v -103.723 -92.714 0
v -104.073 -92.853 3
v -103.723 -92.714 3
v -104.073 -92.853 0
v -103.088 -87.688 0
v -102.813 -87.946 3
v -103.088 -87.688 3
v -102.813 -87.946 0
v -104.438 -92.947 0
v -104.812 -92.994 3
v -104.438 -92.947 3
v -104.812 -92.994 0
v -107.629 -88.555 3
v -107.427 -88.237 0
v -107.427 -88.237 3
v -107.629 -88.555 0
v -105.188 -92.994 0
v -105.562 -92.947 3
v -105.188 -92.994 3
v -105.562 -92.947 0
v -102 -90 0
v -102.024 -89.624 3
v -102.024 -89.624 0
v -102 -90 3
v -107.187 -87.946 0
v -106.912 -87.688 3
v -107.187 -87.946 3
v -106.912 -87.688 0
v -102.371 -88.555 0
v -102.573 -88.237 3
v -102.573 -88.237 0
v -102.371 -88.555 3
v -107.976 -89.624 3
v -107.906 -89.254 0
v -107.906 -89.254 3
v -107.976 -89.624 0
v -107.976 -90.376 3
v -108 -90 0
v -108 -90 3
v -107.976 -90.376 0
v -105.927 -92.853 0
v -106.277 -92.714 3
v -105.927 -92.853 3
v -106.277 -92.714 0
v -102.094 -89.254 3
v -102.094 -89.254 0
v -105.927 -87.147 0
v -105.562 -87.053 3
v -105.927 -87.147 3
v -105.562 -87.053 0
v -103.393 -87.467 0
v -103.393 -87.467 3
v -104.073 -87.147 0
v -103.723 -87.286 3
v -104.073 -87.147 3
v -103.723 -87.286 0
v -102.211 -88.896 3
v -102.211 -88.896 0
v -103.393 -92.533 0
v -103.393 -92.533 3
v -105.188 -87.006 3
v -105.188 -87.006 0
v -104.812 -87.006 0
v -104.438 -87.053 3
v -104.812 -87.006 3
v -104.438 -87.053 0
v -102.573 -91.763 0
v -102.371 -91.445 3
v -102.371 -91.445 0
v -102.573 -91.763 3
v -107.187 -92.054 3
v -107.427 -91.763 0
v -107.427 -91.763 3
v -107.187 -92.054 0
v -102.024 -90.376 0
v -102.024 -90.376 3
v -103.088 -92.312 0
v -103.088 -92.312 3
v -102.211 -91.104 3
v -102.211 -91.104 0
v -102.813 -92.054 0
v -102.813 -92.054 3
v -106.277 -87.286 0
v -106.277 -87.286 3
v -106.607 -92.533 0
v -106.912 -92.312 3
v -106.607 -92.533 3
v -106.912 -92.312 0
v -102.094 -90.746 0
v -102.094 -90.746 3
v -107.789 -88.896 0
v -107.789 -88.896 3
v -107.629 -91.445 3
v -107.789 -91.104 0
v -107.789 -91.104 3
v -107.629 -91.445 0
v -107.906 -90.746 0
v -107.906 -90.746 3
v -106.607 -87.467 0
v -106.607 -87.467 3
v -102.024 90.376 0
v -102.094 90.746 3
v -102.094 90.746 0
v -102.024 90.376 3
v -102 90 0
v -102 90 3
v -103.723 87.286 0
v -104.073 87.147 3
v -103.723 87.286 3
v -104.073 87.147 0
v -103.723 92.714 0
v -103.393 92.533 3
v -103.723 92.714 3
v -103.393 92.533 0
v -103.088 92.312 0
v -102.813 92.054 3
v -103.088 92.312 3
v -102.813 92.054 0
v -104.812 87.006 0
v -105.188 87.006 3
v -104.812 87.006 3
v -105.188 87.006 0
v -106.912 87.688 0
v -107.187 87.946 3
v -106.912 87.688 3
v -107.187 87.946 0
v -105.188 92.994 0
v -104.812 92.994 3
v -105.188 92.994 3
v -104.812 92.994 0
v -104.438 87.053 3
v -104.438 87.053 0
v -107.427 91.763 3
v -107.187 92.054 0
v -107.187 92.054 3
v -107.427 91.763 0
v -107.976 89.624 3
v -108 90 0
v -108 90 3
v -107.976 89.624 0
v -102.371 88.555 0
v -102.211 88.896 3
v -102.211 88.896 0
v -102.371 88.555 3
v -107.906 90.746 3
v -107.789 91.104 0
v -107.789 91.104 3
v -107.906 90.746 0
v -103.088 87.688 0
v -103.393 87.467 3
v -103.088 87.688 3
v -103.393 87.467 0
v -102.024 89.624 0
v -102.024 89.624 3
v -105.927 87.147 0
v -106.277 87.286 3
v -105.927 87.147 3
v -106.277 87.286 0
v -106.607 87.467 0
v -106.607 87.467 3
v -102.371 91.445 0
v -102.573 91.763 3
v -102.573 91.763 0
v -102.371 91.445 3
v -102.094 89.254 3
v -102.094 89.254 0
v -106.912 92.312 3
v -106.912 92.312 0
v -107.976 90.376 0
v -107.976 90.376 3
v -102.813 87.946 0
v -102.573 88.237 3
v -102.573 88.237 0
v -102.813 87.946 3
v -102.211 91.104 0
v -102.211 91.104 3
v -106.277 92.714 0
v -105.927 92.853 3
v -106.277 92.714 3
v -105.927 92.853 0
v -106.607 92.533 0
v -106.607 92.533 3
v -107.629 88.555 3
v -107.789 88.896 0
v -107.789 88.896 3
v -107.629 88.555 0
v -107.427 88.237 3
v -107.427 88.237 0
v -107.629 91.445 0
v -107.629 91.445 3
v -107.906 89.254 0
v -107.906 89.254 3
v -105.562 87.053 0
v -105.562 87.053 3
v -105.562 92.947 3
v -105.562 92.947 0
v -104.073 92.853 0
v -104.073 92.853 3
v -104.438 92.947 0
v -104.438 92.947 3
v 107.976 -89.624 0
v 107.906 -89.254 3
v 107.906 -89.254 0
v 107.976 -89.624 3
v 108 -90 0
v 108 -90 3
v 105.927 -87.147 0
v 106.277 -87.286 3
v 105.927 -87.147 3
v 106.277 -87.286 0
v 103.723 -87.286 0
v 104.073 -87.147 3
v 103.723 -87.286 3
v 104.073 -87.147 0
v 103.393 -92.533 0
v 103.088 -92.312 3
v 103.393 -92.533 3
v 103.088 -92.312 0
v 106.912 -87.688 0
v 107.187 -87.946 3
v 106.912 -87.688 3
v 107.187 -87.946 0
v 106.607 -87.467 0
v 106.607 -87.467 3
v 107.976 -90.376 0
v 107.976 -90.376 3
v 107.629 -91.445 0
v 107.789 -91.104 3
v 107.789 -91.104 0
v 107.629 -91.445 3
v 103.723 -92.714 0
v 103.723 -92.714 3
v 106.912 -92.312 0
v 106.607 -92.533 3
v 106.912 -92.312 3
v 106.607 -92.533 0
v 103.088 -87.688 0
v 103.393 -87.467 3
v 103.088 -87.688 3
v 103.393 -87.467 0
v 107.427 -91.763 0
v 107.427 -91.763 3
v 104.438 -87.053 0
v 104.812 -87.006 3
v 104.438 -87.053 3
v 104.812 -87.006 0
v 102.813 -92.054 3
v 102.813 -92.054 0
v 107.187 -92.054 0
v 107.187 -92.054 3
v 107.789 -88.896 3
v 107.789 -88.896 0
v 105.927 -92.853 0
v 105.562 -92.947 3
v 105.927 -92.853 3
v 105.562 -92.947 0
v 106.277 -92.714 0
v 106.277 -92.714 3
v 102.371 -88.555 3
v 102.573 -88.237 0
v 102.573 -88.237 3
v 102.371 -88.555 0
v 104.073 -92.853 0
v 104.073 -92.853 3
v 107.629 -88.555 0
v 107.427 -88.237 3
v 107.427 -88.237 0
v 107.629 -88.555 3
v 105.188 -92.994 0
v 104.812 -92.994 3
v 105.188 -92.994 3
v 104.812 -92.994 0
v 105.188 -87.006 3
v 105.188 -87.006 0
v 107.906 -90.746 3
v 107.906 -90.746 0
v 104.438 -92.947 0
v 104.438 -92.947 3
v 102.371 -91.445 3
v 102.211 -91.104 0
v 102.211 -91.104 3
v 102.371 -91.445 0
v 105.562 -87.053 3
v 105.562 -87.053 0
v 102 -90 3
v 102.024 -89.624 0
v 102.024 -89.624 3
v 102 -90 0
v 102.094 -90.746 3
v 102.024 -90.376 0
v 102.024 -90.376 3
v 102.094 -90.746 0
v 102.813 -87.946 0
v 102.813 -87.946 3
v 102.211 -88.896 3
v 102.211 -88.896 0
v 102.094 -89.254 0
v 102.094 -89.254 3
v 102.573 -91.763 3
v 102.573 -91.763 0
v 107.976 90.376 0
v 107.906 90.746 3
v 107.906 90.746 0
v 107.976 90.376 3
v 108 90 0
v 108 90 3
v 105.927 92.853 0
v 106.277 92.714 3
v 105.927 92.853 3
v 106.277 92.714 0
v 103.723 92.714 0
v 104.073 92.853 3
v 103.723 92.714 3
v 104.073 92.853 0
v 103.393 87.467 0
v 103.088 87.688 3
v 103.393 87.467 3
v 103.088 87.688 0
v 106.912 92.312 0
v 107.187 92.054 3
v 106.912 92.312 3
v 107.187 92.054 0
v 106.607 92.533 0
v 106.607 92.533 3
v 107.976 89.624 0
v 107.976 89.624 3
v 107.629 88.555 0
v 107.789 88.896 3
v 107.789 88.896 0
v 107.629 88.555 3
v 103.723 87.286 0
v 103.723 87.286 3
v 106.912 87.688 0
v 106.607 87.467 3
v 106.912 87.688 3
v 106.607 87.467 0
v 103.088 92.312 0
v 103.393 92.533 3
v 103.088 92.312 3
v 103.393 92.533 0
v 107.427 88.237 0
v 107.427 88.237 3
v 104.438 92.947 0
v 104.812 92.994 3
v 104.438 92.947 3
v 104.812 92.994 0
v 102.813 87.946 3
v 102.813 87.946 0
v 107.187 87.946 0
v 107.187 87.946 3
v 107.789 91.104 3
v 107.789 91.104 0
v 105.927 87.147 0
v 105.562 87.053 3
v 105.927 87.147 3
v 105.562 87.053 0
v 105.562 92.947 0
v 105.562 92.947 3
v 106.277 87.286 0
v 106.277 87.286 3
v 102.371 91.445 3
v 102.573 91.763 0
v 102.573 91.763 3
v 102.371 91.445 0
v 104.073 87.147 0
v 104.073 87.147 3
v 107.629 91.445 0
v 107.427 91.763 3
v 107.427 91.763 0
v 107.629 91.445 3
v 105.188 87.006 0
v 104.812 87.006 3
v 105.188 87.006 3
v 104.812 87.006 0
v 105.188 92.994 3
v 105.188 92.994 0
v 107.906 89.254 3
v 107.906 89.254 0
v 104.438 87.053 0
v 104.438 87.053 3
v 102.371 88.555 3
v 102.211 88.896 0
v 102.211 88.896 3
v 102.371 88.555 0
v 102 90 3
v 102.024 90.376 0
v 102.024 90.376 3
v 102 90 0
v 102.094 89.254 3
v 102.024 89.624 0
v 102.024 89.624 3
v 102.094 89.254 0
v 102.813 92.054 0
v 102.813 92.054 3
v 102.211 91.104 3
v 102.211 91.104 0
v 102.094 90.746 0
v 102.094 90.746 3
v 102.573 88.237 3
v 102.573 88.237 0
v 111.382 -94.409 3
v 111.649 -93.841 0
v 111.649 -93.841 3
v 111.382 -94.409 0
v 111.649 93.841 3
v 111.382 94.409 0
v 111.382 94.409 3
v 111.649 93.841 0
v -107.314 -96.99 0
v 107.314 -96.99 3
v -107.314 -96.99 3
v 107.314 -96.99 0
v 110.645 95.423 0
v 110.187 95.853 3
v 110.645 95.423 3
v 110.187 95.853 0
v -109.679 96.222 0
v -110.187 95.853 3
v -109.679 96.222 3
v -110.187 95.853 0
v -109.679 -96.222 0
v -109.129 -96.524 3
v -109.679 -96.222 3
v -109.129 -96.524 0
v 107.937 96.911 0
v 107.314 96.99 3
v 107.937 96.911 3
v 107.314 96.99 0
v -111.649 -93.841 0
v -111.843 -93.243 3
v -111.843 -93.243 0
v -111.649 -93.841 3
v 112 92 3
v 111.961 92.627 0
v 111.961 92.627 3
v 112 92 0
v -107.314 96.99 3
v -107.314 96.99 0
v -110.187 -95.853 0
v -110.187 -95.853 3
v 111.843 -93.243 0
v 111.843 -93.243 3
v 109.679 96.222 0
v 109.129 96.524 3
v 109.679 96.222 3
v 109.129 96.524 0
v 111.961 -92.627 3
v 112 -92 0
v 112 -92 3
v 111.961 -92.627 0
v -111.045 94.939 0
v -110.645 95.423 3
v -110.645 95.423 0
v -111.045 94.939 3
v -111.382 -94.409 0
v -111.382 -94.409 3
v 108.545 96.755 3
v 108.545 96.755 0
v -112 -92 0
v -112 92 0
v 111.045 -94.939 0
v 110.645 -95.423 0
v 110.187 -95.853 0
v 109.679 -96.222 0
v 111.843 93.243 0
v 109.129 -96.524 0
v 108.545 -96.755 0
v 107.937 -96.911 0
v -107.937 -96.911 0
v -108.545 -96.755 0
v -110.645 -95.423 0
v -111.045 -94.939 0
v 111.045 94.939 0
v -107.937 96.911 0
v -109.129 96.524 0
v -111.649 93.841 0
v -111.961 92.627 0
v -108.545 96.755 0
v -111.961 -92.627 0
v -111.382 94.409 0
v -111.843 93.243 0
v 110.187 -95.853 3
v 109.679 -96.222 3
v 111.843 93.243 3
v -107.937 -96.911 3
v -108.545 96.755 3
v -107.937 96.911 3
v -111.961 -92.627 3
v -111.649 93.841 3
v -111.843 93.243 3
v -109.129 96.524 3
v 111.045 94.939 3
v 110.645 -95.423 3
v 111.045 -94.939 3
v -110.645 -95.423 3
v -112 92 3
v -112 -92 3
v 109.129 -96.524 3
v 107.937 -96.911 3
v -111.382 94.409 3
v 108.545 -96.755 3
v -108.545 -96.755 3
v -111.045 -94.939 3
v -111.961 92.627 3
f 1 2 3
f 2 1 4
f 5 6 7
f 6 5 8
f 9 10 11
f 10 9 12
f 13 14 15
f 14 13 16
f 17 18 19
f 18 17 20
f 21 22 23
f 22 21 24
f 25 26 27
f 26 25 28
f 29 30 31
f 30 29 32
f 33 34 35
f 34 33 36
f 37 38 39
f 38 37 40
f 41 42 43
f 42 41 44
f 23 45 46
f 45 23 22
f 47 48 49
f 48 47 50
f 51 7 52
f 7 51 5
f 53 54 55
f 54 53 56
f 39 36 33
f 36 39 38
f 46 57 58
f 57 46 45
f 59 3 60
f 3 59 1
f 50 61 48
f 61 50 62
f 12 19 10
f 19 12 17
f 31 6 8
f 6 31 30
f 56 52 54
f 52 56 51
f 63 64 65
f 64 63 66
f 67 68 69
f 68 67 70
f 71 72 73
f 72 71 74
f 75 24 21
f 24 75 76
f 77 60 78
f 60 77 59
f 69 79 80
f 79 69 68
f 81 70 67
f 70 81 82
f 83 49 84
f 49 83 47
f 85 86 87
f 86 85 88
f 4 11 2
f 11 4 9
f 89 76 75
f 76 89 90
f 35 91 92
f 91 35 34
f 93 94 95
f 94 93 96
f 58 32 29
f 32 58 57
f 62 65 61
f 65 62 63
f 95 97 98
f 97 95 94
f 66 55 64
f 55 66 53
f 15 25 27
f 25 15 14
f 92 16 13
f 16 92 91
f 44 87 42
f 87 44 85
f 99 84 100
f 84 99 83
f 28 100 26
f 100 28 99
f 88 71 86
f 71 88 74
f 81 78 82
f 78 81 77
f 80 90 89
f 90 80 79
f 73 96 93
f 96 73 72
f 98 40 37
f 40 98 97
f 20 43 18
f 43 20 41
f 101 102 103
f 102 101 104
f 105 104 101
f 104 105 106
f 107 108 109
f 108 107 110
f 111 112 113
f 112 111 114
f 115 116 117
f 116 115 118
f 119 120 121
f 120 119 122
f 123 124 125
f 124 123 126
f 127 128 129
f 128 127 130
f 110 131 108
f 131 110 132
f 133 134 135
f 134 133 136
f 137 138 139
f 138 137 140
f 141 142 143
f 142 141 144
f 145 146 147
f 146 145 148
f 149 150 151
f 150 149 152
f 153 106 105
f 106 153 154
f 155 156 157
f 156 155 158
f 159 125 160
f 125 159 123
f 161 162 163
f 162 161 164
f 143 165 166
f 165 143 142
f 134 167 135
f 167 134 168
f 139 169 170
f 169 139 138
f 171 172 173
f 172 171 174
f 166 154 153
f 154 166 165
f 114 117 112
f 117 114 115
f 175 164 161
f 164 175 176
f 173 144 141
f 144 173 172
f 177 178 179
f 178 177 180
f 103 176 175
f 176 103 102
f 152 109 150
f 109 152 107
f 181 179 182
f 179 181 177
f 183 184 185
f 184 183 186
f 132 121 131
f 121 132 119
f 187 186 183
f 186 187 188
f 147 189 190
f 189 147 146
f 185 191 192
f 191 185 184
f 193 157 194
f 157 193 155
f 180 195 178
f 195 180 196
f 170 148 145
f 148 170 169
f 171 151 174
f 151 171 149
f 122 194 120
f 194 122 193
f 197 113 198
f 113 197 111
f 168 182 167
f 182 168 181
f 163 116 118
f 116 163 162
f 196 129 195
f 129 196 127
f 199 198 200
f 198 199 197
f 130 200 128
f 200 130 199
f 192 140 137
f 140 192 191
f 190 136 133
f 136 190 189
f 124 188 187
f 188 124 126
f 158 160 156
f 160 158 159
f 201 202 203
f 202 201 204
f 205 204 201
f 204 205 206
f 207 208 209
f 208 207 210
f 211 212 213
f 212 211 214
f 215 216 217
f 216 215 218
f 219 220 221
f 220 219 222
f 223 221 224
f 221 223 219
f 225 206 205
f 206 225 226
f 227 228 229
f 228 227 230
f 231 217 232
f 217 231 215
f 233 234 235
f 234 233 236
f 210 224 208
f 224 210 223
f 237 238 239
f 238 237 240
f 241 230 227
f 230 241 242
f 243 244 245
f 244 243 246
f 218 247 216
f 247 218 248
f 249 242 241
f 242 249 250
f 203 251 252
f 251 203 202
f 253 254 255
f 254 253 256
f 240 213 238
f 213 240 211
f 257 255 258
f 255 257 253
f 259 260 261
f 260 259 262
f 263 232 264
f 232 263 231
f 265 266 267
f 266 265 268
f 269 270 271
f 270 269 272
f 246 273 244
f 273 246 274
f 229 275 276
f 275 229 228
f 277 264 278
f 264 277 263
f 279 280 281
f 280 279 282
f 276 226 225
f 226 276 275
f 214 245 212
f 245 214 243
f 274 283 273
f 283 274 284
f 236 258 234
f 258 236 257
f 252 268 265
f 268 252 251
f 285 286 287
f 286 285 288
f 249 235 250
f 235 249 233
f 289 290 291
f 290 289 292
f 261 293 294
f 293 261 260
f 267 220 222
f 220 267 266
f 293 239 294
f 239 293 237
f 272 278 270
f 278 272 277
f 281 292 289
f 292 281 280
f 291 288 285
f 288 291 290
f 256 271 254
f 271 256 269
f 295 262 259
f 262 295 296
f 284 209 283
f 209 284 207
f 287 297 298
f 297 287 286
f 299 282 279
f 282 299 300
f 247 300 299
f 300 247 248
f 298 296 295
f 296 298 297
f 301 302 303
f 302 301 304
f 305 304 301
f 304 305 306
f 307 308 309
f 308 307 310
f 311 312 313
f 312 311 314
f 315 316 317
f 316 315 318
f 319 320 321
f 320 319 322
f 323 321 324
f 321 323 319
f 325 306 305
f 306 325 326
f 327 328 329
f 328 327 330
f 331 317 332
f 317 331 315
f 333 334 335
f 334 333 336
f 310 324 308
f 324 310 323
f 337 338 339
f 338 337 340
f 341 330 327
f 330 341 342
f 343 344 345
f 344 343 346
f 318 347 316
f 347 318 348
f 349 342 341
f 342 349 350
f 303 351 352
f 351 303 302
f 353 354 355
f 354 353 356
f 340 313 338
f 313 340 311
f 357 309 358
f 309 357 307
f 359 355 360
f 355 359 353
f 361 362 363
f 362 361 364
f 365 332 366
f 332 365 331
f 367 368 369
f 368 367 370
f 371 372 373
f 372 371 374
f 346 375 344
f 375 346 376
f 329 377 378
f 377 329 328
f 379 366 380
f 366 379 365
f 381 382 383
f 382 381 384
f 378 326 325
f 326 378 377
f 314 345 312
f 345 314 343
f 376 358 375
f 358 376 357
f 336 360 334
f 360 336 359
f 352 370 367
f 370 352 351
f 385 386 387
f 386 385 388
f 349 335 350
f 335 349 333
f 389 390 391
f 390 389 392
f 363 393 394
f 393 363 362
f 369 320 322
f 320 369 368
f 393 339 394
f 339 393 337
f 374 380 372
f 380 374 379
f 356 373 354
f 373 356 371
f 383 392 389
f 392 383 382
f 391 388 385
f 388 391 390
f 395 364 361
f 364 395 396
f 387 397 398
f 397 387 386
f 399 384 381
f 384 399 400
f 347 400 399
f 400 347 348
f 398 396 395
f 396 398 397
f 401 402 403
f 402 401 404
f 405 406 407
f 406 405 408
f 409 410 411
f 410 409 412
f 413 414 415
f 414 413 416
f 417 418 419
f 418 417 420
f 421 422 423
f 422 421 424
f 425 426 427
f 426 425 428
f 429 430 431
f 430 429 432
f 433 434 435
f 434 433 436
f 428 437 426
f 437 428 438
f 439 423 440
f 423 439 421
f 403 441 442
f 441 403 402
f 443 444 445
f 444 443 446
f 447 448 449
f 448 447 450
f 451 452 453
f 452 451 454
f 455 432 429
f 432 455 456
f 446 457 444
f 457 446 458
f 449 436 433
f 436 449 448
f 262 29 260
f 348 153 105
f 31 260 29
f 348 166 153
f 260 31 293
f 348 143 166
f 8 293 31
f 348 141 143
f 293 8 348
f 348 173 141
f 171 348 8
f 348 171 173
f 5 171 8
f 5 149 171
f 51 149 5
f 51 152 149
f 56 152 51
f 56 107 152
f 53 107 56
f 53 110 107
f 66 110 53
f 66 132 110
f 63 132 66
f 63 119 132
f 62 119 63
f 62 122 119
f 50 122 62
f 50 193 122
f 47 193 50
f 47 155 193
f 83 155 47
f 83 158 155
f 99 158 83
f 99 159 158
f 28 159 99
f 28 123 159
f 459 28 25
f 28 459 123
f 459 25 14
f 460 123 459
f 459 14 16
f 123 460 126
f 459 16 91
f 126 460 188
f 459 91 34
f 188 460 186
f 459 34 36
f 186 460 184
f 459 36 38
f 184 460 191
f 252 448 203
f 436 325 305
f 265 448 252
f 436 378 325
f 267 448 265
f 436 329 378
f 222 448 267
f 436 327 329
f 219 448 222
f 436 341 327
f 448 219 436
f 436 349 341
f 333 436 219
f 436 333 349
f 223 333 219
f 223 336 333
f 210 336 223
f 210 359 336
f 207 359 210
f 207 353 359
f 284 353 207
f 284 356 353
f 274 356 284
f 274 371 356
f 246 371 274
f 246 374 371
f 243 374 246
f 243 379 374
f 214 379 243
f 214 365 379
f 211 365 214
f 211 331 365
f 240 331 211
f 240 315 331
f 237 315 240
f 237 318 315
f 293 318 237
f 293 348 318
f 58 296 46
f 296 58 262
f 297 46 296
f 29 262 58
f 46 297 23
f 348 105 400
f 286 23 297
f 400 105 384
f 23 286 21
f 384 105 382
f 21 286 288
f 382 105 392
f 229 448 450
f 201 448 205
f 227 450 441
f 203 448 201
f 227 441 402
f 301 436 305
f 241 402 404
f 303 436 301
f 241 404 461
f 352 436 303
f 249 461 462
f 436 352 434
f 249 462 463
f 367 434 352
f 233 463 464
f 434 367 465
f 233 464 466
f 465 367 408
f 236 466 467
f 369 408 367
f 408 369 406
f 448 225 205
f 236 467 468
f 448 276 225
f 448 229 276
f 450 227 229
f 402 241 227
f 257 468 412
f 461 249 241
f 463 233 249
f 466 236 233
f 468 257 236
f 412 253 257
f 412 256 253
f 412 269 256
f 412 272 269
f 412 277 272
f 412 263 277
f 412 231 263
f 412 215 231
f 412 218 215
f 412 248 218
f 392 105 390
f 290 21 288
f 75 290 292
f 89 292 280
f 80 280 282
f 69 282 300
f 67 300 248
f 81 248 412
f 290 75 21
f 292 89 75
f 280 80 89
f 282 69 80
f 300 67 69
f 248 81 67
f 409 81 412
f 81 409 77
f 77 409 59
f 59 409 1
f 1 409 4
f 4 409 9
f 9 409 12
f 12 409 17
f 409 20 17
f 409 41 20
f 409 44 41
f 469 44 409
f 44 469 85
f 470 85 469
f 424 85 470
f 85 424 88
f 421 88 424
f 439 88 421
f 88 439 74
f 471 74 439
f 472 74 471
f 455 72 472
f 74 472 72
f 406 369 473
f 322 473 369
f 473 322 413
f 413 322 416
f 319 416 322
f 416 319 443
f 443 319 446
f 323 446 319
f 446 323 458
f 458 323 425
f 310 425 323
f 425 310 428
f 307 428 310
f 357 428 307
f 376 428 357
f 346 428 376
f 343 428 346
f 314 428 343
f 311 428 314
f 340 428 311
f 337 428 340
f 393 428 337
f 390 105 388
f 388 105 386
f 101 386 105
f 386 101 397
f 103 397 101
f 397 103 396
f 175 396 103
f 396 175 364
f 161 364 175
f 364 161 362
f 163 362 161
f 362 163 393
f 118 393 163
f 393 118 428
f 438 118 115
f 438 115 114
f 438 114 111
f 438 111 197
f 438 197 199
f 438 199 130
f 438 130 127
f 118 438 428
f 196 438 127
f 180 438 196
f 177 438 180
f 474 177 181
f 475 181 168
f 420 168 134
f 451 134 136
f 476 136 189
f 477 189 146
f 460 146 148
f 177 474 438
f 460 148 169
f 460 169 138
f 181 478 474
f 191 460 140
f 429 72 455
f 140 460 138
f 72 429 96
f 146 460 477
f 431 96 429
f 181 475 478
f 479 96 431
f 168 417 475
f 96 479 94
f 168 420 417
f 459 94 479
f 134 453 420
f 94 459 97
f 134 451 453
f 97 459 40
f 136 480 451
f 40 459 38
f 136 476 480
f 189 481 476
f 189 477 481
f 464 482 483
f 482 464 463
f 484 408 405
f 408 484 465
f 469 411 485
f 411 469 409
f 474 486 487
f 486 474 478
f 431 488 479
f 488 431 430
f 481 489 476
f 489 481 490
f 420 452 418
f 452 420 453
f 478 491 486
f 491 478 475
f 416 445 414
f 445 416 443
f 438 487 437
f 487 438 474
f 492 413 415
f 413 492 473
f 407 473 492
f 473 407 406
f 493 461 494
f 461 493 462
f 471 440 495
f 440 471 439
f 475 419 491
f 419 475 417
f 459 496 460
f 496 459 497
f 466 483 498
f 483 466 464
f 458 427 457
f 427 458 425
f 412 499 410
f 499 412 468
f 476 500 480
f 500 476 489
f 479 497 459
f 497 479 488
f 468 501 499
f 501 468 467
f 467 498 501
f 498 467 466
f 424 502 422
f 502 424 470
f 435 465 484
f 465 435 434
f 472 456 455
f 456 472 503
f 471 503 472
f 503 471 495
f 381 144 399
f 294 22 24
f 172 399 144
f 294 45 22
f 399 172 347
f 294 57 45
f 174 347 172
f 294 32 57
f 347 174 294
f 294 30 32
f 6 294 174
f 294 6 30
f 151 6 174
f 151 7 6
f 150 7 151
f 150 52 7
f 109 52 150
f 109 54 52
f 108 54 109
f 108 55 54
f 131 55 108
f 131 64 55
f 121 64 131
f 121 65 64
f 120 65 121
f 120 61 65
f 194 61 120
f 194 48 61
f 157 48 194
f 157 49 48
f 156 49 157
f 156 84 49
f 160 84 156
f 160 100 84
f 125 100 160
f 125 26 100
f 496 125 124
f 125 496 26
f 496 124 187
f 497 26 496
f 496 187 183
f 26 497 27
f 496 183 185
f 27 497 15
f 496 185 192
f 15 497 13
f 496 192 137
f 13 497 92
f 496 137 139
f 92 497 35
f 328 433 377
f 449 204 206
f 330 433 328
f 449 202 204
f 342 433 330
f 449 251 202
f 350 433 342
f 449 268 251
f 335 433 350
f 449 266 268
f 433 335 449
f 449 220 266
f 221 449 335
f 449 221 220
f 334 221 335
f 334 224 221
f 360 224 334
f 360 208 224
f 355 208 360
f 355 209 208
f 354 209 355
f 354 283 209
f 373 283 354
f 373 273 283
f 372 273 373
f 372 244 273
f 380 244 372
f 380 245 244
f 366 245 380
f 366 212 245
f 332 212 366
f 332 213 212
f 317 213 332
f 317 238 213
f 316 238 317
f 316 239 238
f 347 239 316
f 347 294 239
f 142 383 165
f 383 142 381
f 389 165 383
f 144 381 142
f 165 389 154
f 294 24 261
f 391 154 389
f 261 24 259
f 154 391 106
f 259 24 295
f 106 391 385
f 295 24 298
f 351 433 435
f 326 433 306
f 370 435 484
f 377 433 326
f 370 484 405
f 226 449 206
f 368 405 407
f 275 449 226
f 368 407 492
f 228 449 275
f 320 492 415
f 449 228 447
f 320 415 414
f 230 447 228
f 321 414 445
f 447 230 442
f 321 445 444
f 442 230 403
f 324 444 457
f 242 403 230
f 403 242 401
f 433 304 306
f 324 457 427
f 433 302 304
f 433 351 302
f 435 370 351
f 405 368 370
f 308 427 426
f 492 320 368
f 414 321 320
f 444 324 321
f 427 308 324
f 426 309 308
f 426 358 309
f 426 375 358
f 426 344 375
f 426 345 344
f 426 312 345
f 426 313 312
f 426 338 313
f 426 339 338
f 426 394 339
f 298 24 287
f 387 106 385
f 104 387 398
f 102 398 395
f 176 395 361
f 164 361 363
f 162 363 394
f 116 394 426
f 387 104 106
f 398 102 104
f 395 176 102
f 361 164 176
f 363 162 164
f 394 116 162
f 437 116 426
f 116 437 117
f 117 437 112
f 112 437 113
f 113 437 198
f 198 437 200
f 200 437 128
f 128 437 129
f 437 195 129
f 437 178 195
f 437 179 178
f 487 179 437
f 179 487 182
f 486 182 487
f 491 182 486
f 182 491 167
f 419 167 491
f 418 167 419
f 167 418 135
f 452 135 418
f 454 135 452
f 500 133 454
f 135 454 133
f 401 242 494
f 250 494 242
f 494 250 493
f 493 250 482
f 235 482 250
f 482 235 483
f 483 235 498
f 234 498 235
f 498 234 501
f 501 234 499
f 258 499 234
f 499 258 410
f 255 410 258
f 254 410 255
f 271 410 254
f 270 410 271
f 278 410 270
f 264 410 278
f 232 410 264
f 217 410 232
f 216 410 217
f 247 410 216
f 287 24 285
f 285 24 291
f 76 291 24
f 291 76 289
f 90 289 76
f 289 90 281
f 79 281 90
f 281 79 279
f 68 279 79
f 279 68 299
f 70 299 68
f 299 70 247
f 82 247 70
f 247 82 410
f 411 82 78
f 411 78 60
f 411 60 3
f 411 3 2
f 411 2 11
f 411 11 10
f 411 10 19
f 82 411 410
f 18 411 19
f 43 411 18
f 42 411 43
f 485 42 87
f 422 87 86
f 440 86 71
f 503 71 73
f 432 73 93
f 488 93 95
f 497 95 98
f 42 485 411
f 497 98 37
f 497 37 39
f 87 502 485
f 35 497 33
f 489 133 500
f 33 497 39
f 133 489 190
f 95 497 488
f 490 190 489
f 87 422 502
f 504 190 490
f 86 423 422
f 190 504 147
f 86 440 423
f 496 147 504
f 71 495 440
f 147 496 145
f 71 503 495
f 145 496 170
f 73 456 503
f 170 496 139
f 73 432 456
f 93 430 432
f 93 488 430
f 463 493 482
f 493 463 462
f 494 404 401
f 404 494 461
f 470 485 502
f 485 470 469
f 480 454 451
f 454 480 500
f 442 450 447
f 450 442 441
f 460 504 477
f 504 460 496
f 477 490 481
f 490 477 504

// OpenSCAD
$fn = 50;


difference() {
	union() {
		hull() {
			translate(v = [-107.0000000000, 92.0000000000, 0]) {
				cylinder(h = 3, r = 5);
			}
			translate(v = [107.0000000000, 92.0000000000, 0]) {
				cylinder(h = 3, r = 5);
			}
			translate(v = [-107.0000000000, -92.0000000000, 0]) {
				cylinder(h = 3, r = 5);
			}
			translate(v = [107.0000000000, -92.0000000000, 0]) {
				cylinder(h = 3, r = 5);
			}
		}
	}
	union() {
		translate(v = [-105.0000000000, -90.0000000000, -100.0000000000]) {
			cylinder(h = 200, r = 3.0000000000);
		}
		translate(v = [-105.0000000000, 90.0000000000, -100.0000000000]) {
			cylinder(h = 200, r = 3.0000000000);
		}
		translate(v = [105.0000000000, -90.0000000000, -100.0000000000]) {
			cylinder(h = 200, r = 3.0000000000);
		}
		translate(v = [105.0000000000, 90.0000000000, -100.0000000000]) {
			cylinder(h = 200, r = 3.0000000000);
		}
	}
}
